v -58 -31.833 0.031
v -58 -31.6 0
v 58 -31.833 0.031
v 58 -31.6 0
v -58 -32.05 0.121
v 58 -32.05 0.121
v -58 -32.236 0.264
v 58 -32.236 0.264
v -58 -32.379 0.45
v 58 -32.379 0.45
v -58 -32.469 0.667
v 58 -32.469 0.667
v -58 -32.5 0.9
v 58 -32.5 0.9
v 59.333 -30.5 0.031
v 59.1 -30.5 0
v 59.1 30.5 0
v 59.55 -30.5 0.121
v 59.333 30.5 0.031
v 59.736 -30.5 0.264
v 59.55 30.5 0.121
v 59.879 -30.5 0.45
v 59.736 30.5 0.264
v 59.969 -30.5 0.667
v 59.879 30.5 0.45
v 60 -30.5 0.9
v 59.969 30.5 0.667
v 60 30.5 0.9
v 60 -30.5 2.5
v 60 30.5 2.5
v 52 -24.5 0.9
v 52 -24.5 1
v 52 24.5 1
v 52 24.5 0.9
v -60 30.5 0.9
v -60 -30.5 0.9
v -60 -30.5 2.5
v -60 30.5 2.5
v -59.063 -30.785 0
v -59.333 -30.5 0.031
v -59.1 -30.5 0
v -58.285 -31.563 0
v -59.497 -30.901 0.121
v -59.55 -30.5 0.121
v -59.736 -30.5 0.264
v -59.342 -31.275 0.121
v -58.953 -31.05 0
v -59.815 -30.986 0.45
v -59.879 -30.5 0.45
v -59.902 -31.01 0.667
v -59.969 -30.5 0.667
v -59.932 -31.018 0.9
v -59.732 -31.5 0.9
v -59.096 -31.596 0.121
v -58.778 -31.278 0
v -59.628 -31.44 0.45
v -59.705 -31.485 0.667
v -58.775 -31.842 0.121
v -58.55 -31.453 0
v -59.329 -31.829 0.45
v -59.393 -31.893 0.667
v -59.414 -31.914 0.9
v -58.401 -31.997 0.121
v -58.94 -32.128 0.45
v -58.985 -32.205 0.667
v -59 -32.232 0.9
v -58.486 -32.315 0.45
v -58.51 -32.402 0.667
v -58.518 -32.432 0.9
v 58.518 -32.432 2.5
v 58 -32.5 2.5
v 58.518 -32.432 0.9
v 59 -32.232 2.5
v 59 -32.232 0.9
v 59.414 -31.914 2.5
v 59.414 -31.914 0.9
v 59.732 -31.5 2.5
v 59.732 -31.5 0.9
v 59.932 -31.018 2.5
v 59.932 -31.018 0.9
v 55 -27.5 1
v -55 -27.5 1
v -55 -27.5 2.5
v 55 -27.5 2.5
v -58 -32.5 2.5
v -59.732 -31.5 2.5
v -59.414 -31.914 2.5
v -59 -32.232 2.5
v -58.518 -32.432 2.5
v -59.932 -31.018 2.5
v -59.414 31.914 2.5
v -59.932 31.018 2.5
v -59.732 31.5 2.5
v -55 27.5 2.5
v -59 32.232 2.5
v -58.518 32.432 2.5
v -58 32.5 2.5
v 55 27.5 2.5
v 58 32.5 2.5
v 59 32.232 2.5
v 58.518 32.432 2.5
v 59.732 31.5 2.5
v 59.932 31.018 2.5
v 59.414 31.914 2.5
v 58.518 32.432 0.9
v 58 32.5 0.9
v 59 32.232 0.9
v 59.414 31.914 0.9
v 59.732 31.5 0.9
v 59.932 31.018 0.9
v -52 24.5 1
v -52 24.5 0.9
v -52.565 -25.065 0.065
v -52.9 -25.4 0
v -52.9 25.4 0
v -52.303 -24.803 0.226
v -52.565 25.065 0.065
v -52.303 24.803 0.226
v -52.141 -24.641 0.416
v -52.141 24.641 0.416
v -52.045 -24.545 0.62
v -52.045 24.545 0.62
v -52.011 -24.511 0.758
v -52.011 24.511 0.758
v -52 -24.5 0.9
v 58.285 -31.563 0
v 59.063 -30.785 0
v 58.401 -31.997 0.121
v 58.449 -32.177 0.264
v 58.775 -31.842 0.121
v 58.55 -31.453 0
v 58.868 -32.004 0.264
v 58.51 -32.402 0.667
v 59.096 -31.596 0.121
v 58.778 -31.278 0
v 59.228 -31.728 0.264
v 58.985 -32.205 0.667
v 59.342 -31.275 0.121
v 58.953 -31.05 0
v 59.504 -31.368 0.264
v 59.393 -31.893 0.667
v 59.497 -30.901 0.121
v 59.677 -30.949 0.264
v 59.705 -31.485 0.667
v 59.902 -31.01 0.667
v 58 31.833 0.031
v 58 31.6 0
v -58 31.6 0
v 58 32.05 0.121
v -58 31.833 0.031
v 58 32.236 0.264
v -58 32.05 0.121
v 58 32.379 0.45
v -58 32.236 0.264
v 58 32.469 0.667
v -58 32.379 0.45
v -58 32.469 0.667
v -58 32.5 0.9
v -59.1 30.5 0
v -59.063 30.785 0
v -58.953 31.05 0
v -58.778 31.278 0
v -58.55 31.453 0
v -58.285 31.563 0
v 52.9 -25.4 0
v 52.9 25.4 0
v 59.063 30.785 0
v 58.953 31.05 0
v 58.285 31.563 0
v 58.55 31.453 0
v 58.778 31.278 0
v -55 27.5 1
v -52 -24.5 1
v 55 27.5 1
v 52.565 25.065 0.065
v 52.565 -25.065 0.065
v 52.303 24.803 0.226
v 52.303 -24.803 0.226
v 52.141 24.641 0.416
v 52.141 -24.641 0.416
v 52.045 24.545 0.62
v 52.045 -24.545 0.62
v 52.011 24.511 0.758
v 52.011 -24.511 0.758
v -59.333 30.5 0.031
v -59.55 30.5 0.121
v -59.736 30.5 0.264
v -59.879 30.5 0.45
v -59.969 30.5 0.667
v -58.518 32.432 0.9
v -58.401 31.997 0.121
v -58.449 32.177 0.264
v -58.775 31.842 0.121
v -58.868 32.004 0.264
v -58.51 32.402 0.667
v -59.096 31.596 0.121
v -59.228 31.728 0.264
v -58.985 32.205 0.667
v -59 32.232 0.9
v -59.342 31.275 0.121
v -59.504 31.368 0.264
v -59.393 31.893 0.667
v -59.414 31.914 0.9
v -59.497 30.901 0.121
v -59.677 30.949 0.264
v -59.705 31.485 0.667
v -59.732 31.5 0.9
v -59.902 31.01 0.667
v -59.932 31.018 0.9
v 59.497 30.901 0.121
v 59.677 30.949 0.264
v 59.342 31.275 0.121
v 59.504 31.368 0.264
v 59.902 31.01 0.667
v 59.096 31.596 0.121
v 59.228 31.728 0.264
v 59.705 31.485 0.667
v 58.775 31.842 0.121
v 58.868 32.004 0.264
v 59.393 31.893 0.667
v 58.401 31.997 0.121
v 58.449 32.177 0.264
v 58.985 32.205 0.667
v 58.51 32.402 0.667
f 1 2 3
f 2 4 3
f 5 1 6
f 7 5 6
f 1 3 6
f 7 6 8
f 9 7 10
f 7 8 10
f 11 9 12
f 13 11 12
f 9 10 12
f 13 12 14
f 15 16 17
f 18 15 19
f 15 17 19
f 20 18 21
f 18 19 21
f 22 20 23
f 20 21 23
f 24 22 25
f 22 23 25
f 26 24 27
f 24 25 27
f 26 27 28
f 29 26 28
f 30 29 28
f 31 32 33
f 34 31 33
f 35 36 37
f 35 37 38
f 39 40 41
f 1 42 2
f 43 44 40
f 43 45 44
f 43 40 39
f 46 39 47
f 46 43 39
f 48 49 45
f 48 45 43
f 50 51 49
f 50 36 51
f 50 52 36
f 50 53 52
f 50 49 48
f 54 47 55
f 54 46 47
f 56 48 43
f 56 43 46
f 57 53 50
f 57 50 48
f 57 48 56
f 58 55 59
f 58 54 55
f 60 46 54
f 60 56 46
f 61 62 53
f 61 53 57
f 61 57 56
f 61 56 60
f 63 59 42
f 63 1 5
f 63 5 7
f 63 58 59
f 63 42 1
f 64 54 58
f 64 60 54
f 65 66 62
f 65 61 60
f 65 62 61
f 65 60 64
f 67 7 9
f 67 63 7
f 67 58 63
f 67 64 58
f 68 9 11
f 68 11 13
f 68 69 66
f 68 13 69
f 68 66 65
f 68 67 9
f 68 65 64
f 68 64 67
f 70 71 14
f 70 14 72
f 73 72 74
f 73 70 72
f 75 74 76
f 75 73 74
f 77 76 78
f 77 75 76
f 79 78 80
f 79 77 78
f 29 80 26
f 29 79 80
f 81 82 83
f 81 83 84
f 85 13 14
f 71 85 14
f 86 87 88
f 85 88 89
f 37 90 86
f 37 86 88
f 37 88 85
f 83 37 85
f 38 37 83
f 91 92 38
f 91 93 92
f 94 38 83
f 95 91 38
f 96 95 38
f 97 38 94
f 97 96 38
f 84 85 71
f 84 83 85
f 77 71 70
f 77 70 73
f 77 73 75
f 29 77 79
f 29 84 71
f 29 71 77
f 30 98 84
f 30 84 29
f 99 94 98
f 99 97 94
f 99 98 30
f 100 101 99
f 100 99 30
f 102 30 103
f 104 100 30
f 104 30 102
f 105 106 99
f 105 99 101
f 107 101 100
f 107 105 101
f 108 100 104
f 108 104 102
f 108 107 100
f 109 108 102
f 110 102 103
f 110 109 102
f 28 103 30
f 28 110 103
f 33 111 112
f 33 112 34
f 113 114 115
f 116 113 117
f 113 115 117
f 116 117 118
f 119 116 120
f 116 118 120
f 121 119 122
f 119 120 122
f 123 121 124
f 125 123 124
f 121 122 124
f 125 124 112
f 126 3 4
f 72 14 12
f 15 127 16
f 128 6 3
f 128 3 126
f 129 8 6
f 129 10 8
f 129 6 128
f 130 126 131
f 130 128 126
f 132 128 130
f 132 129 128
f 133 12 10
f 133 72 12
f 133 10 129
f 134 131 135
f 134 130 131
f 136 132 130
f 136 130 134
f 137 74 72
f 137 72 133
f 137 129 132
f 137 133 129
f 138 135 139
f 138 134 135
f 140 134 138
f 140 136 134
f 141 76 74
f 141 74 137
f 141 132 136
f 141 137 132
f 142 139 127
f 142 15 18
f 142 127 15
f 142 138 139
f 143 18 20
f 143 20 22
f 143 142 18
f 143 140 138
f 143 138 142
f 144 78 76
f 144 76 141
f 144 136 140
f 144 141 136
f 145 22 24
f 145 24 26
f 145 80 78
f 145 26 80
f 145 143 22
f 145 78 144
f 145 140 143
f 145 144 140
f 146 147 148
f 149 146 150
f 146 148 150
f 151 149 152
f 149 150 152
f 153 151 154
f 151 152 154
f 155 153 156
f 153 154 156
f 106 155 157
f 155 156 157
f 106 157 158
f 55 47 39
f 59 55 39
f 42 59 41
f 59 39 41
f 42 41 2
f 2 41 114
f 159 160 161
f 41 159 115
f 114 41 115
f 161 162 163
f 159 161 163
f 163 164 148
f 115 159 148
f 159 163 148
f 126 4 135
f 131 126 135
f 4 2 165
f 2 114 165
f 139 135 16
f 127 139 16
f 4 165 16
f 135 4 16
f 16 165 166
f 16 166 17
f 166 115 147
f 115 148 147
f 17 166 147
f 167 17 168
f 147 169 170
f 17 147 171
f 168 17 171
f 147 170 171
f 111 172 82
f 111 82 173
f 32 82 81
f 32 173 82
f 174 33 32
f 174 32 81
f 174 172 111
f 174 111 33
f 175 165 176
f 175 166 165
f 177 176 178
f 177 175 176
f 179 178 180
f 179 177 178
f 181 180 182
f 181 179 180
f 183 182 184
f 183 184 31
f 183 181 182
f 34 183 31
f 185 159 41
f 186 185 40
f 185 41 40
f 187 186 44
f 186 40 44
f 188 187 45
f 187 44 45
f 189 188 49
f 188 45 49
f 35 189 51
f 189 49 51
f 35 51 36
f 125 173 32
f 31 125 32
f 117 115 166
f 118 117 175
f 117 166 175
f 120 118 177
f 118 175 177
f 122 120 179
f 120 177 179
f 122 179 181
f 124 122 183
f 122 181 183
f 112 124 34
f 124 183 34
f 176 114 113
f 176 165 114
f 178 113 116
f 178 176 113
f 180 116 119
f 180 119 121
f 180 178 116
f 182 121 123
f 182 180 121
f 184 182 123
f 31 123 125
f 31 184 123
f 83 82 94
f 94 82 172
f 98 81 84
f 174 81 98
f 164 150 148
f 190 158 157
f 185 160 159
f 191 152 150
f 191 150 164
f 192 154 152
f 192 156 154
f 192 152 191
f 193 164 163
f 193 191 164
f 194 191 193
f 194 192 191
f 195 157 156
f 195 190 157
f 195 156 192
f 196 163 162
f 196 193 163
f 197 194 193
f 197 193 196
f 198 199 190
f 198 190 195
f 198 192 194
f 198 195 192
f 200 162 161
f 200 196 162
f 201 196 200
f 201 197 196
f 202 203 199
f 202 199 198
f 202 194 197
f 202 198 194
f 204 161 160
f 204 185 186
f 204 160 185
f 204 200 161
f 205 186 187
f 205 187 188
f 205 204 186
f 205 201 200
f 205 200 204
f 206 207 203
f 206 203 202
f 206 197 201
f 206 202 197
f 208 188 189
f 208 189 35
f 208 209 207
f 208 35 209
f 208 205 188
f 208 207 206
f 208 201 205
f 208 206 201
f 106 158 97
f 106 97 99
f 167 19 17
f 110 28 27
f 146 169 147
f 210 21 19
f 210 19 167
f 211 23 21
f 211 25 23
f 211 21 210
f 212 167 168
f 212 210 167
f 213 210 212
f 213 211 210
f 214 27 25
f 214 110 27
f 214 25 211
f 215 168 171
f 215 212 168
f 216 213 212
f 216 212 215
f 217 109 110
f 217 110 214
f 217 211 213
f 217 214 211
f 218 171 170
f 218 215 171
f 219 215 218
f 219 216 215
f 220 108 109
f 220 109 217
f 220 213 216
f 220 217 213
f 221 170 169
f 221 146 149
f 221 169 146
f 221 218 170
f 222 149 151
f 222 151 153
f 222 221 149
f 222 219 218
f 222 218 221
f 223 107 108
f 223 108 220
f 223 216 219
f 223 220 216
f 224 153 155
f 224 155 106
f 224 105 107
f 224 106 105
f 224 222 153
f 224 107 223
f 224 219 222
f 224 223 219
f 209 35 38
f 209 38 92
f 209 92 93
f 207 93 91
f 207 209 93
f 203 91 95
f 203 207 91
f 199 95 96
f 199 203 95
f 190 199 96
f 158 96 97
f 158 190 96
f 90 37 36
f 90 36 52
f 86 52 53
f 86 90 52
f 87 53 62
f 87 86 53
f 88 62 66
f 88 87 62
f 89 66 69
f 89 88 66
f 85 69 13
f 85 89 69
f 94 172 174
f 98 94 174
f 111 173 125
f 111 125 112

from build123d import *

# Parameters (mm, degrees)
SKETCH_W      = 120
SKETCH_H      = 65
PAD_DEPTH     = 1
SKETCH001_W   = 120
SKETCH001_H   = 65
SKETCH001_W_2 = 110
SKETCH001_H_2 = 55
PAD001_DEPTH  = 1.5
SKETCH002_W   = 104
SKETCH002_H   = 49
POCKET_DEPTH  = 1.001
FILLET_R      = 2
FILLET001_R   = 0.9


with BuildPart() as part:
    # Sketch → Pad (new body)
    with BuildSketch(Plane.XY):
        Rectangle(SKETCH_W, SKETCH_H)
    extrude(amount=PAD_DEPTH)

    # Sketch001 (on Face6 of Pad) → Pad001 (join)
    with BuildSketch(Plane.XY.offset(1)):
        Rectangle(SKETCH001_W, SKETCH001_H)
        Rectangle(SKETCH001_W_2, SKETCH001_H_2, mode=Mode.SUBTRACT)
    extrude(amount=PAD001_DEPTH)

    # Sketch002 (on Face15 of Pad001) → Pocket (cut, through all)
    with BuildSketch(Plane.XY.offset(1)):
        Rectangle(SKETCH002_W, SKETCH002_H)
    extrude(amount=-POCKET_DEPTH, mode=Mode.SUBTRACT)

    # Fillet
    fillet_edges = [part.edges().sort_by_distance(p)[0] for p in [
        (-60, -32.5, 1.75),
        (-60, -32.5, 0.5),
        (60, -32.5, 1.75),
        (60, -32.5, 0.5),
        (-60, 32.5, 1.75),
        (-60, 32.5, 0.5),
        (60, 32.5, 1.75),
        (60, 32.5, 0.5),
    ]]
    fillet(fillet_edges, radius=FILLET_R)

    # Fillet001
    fillet001_edges = [part.edges().sort_by_distance(p)[0] for p in [
        (0, -32.5, 0),
        (0, -24.5, 0),
        (52, 0, 0),
        (0, 24.5, 0),
        (-52, 0, 0),
        (-60, 0, 0),
        (0, 32.5, 0),
        (60, 0, 0),
    ]]
    fillet(fillet001_edges, radius=FILLET001_R)


solid = part.part
